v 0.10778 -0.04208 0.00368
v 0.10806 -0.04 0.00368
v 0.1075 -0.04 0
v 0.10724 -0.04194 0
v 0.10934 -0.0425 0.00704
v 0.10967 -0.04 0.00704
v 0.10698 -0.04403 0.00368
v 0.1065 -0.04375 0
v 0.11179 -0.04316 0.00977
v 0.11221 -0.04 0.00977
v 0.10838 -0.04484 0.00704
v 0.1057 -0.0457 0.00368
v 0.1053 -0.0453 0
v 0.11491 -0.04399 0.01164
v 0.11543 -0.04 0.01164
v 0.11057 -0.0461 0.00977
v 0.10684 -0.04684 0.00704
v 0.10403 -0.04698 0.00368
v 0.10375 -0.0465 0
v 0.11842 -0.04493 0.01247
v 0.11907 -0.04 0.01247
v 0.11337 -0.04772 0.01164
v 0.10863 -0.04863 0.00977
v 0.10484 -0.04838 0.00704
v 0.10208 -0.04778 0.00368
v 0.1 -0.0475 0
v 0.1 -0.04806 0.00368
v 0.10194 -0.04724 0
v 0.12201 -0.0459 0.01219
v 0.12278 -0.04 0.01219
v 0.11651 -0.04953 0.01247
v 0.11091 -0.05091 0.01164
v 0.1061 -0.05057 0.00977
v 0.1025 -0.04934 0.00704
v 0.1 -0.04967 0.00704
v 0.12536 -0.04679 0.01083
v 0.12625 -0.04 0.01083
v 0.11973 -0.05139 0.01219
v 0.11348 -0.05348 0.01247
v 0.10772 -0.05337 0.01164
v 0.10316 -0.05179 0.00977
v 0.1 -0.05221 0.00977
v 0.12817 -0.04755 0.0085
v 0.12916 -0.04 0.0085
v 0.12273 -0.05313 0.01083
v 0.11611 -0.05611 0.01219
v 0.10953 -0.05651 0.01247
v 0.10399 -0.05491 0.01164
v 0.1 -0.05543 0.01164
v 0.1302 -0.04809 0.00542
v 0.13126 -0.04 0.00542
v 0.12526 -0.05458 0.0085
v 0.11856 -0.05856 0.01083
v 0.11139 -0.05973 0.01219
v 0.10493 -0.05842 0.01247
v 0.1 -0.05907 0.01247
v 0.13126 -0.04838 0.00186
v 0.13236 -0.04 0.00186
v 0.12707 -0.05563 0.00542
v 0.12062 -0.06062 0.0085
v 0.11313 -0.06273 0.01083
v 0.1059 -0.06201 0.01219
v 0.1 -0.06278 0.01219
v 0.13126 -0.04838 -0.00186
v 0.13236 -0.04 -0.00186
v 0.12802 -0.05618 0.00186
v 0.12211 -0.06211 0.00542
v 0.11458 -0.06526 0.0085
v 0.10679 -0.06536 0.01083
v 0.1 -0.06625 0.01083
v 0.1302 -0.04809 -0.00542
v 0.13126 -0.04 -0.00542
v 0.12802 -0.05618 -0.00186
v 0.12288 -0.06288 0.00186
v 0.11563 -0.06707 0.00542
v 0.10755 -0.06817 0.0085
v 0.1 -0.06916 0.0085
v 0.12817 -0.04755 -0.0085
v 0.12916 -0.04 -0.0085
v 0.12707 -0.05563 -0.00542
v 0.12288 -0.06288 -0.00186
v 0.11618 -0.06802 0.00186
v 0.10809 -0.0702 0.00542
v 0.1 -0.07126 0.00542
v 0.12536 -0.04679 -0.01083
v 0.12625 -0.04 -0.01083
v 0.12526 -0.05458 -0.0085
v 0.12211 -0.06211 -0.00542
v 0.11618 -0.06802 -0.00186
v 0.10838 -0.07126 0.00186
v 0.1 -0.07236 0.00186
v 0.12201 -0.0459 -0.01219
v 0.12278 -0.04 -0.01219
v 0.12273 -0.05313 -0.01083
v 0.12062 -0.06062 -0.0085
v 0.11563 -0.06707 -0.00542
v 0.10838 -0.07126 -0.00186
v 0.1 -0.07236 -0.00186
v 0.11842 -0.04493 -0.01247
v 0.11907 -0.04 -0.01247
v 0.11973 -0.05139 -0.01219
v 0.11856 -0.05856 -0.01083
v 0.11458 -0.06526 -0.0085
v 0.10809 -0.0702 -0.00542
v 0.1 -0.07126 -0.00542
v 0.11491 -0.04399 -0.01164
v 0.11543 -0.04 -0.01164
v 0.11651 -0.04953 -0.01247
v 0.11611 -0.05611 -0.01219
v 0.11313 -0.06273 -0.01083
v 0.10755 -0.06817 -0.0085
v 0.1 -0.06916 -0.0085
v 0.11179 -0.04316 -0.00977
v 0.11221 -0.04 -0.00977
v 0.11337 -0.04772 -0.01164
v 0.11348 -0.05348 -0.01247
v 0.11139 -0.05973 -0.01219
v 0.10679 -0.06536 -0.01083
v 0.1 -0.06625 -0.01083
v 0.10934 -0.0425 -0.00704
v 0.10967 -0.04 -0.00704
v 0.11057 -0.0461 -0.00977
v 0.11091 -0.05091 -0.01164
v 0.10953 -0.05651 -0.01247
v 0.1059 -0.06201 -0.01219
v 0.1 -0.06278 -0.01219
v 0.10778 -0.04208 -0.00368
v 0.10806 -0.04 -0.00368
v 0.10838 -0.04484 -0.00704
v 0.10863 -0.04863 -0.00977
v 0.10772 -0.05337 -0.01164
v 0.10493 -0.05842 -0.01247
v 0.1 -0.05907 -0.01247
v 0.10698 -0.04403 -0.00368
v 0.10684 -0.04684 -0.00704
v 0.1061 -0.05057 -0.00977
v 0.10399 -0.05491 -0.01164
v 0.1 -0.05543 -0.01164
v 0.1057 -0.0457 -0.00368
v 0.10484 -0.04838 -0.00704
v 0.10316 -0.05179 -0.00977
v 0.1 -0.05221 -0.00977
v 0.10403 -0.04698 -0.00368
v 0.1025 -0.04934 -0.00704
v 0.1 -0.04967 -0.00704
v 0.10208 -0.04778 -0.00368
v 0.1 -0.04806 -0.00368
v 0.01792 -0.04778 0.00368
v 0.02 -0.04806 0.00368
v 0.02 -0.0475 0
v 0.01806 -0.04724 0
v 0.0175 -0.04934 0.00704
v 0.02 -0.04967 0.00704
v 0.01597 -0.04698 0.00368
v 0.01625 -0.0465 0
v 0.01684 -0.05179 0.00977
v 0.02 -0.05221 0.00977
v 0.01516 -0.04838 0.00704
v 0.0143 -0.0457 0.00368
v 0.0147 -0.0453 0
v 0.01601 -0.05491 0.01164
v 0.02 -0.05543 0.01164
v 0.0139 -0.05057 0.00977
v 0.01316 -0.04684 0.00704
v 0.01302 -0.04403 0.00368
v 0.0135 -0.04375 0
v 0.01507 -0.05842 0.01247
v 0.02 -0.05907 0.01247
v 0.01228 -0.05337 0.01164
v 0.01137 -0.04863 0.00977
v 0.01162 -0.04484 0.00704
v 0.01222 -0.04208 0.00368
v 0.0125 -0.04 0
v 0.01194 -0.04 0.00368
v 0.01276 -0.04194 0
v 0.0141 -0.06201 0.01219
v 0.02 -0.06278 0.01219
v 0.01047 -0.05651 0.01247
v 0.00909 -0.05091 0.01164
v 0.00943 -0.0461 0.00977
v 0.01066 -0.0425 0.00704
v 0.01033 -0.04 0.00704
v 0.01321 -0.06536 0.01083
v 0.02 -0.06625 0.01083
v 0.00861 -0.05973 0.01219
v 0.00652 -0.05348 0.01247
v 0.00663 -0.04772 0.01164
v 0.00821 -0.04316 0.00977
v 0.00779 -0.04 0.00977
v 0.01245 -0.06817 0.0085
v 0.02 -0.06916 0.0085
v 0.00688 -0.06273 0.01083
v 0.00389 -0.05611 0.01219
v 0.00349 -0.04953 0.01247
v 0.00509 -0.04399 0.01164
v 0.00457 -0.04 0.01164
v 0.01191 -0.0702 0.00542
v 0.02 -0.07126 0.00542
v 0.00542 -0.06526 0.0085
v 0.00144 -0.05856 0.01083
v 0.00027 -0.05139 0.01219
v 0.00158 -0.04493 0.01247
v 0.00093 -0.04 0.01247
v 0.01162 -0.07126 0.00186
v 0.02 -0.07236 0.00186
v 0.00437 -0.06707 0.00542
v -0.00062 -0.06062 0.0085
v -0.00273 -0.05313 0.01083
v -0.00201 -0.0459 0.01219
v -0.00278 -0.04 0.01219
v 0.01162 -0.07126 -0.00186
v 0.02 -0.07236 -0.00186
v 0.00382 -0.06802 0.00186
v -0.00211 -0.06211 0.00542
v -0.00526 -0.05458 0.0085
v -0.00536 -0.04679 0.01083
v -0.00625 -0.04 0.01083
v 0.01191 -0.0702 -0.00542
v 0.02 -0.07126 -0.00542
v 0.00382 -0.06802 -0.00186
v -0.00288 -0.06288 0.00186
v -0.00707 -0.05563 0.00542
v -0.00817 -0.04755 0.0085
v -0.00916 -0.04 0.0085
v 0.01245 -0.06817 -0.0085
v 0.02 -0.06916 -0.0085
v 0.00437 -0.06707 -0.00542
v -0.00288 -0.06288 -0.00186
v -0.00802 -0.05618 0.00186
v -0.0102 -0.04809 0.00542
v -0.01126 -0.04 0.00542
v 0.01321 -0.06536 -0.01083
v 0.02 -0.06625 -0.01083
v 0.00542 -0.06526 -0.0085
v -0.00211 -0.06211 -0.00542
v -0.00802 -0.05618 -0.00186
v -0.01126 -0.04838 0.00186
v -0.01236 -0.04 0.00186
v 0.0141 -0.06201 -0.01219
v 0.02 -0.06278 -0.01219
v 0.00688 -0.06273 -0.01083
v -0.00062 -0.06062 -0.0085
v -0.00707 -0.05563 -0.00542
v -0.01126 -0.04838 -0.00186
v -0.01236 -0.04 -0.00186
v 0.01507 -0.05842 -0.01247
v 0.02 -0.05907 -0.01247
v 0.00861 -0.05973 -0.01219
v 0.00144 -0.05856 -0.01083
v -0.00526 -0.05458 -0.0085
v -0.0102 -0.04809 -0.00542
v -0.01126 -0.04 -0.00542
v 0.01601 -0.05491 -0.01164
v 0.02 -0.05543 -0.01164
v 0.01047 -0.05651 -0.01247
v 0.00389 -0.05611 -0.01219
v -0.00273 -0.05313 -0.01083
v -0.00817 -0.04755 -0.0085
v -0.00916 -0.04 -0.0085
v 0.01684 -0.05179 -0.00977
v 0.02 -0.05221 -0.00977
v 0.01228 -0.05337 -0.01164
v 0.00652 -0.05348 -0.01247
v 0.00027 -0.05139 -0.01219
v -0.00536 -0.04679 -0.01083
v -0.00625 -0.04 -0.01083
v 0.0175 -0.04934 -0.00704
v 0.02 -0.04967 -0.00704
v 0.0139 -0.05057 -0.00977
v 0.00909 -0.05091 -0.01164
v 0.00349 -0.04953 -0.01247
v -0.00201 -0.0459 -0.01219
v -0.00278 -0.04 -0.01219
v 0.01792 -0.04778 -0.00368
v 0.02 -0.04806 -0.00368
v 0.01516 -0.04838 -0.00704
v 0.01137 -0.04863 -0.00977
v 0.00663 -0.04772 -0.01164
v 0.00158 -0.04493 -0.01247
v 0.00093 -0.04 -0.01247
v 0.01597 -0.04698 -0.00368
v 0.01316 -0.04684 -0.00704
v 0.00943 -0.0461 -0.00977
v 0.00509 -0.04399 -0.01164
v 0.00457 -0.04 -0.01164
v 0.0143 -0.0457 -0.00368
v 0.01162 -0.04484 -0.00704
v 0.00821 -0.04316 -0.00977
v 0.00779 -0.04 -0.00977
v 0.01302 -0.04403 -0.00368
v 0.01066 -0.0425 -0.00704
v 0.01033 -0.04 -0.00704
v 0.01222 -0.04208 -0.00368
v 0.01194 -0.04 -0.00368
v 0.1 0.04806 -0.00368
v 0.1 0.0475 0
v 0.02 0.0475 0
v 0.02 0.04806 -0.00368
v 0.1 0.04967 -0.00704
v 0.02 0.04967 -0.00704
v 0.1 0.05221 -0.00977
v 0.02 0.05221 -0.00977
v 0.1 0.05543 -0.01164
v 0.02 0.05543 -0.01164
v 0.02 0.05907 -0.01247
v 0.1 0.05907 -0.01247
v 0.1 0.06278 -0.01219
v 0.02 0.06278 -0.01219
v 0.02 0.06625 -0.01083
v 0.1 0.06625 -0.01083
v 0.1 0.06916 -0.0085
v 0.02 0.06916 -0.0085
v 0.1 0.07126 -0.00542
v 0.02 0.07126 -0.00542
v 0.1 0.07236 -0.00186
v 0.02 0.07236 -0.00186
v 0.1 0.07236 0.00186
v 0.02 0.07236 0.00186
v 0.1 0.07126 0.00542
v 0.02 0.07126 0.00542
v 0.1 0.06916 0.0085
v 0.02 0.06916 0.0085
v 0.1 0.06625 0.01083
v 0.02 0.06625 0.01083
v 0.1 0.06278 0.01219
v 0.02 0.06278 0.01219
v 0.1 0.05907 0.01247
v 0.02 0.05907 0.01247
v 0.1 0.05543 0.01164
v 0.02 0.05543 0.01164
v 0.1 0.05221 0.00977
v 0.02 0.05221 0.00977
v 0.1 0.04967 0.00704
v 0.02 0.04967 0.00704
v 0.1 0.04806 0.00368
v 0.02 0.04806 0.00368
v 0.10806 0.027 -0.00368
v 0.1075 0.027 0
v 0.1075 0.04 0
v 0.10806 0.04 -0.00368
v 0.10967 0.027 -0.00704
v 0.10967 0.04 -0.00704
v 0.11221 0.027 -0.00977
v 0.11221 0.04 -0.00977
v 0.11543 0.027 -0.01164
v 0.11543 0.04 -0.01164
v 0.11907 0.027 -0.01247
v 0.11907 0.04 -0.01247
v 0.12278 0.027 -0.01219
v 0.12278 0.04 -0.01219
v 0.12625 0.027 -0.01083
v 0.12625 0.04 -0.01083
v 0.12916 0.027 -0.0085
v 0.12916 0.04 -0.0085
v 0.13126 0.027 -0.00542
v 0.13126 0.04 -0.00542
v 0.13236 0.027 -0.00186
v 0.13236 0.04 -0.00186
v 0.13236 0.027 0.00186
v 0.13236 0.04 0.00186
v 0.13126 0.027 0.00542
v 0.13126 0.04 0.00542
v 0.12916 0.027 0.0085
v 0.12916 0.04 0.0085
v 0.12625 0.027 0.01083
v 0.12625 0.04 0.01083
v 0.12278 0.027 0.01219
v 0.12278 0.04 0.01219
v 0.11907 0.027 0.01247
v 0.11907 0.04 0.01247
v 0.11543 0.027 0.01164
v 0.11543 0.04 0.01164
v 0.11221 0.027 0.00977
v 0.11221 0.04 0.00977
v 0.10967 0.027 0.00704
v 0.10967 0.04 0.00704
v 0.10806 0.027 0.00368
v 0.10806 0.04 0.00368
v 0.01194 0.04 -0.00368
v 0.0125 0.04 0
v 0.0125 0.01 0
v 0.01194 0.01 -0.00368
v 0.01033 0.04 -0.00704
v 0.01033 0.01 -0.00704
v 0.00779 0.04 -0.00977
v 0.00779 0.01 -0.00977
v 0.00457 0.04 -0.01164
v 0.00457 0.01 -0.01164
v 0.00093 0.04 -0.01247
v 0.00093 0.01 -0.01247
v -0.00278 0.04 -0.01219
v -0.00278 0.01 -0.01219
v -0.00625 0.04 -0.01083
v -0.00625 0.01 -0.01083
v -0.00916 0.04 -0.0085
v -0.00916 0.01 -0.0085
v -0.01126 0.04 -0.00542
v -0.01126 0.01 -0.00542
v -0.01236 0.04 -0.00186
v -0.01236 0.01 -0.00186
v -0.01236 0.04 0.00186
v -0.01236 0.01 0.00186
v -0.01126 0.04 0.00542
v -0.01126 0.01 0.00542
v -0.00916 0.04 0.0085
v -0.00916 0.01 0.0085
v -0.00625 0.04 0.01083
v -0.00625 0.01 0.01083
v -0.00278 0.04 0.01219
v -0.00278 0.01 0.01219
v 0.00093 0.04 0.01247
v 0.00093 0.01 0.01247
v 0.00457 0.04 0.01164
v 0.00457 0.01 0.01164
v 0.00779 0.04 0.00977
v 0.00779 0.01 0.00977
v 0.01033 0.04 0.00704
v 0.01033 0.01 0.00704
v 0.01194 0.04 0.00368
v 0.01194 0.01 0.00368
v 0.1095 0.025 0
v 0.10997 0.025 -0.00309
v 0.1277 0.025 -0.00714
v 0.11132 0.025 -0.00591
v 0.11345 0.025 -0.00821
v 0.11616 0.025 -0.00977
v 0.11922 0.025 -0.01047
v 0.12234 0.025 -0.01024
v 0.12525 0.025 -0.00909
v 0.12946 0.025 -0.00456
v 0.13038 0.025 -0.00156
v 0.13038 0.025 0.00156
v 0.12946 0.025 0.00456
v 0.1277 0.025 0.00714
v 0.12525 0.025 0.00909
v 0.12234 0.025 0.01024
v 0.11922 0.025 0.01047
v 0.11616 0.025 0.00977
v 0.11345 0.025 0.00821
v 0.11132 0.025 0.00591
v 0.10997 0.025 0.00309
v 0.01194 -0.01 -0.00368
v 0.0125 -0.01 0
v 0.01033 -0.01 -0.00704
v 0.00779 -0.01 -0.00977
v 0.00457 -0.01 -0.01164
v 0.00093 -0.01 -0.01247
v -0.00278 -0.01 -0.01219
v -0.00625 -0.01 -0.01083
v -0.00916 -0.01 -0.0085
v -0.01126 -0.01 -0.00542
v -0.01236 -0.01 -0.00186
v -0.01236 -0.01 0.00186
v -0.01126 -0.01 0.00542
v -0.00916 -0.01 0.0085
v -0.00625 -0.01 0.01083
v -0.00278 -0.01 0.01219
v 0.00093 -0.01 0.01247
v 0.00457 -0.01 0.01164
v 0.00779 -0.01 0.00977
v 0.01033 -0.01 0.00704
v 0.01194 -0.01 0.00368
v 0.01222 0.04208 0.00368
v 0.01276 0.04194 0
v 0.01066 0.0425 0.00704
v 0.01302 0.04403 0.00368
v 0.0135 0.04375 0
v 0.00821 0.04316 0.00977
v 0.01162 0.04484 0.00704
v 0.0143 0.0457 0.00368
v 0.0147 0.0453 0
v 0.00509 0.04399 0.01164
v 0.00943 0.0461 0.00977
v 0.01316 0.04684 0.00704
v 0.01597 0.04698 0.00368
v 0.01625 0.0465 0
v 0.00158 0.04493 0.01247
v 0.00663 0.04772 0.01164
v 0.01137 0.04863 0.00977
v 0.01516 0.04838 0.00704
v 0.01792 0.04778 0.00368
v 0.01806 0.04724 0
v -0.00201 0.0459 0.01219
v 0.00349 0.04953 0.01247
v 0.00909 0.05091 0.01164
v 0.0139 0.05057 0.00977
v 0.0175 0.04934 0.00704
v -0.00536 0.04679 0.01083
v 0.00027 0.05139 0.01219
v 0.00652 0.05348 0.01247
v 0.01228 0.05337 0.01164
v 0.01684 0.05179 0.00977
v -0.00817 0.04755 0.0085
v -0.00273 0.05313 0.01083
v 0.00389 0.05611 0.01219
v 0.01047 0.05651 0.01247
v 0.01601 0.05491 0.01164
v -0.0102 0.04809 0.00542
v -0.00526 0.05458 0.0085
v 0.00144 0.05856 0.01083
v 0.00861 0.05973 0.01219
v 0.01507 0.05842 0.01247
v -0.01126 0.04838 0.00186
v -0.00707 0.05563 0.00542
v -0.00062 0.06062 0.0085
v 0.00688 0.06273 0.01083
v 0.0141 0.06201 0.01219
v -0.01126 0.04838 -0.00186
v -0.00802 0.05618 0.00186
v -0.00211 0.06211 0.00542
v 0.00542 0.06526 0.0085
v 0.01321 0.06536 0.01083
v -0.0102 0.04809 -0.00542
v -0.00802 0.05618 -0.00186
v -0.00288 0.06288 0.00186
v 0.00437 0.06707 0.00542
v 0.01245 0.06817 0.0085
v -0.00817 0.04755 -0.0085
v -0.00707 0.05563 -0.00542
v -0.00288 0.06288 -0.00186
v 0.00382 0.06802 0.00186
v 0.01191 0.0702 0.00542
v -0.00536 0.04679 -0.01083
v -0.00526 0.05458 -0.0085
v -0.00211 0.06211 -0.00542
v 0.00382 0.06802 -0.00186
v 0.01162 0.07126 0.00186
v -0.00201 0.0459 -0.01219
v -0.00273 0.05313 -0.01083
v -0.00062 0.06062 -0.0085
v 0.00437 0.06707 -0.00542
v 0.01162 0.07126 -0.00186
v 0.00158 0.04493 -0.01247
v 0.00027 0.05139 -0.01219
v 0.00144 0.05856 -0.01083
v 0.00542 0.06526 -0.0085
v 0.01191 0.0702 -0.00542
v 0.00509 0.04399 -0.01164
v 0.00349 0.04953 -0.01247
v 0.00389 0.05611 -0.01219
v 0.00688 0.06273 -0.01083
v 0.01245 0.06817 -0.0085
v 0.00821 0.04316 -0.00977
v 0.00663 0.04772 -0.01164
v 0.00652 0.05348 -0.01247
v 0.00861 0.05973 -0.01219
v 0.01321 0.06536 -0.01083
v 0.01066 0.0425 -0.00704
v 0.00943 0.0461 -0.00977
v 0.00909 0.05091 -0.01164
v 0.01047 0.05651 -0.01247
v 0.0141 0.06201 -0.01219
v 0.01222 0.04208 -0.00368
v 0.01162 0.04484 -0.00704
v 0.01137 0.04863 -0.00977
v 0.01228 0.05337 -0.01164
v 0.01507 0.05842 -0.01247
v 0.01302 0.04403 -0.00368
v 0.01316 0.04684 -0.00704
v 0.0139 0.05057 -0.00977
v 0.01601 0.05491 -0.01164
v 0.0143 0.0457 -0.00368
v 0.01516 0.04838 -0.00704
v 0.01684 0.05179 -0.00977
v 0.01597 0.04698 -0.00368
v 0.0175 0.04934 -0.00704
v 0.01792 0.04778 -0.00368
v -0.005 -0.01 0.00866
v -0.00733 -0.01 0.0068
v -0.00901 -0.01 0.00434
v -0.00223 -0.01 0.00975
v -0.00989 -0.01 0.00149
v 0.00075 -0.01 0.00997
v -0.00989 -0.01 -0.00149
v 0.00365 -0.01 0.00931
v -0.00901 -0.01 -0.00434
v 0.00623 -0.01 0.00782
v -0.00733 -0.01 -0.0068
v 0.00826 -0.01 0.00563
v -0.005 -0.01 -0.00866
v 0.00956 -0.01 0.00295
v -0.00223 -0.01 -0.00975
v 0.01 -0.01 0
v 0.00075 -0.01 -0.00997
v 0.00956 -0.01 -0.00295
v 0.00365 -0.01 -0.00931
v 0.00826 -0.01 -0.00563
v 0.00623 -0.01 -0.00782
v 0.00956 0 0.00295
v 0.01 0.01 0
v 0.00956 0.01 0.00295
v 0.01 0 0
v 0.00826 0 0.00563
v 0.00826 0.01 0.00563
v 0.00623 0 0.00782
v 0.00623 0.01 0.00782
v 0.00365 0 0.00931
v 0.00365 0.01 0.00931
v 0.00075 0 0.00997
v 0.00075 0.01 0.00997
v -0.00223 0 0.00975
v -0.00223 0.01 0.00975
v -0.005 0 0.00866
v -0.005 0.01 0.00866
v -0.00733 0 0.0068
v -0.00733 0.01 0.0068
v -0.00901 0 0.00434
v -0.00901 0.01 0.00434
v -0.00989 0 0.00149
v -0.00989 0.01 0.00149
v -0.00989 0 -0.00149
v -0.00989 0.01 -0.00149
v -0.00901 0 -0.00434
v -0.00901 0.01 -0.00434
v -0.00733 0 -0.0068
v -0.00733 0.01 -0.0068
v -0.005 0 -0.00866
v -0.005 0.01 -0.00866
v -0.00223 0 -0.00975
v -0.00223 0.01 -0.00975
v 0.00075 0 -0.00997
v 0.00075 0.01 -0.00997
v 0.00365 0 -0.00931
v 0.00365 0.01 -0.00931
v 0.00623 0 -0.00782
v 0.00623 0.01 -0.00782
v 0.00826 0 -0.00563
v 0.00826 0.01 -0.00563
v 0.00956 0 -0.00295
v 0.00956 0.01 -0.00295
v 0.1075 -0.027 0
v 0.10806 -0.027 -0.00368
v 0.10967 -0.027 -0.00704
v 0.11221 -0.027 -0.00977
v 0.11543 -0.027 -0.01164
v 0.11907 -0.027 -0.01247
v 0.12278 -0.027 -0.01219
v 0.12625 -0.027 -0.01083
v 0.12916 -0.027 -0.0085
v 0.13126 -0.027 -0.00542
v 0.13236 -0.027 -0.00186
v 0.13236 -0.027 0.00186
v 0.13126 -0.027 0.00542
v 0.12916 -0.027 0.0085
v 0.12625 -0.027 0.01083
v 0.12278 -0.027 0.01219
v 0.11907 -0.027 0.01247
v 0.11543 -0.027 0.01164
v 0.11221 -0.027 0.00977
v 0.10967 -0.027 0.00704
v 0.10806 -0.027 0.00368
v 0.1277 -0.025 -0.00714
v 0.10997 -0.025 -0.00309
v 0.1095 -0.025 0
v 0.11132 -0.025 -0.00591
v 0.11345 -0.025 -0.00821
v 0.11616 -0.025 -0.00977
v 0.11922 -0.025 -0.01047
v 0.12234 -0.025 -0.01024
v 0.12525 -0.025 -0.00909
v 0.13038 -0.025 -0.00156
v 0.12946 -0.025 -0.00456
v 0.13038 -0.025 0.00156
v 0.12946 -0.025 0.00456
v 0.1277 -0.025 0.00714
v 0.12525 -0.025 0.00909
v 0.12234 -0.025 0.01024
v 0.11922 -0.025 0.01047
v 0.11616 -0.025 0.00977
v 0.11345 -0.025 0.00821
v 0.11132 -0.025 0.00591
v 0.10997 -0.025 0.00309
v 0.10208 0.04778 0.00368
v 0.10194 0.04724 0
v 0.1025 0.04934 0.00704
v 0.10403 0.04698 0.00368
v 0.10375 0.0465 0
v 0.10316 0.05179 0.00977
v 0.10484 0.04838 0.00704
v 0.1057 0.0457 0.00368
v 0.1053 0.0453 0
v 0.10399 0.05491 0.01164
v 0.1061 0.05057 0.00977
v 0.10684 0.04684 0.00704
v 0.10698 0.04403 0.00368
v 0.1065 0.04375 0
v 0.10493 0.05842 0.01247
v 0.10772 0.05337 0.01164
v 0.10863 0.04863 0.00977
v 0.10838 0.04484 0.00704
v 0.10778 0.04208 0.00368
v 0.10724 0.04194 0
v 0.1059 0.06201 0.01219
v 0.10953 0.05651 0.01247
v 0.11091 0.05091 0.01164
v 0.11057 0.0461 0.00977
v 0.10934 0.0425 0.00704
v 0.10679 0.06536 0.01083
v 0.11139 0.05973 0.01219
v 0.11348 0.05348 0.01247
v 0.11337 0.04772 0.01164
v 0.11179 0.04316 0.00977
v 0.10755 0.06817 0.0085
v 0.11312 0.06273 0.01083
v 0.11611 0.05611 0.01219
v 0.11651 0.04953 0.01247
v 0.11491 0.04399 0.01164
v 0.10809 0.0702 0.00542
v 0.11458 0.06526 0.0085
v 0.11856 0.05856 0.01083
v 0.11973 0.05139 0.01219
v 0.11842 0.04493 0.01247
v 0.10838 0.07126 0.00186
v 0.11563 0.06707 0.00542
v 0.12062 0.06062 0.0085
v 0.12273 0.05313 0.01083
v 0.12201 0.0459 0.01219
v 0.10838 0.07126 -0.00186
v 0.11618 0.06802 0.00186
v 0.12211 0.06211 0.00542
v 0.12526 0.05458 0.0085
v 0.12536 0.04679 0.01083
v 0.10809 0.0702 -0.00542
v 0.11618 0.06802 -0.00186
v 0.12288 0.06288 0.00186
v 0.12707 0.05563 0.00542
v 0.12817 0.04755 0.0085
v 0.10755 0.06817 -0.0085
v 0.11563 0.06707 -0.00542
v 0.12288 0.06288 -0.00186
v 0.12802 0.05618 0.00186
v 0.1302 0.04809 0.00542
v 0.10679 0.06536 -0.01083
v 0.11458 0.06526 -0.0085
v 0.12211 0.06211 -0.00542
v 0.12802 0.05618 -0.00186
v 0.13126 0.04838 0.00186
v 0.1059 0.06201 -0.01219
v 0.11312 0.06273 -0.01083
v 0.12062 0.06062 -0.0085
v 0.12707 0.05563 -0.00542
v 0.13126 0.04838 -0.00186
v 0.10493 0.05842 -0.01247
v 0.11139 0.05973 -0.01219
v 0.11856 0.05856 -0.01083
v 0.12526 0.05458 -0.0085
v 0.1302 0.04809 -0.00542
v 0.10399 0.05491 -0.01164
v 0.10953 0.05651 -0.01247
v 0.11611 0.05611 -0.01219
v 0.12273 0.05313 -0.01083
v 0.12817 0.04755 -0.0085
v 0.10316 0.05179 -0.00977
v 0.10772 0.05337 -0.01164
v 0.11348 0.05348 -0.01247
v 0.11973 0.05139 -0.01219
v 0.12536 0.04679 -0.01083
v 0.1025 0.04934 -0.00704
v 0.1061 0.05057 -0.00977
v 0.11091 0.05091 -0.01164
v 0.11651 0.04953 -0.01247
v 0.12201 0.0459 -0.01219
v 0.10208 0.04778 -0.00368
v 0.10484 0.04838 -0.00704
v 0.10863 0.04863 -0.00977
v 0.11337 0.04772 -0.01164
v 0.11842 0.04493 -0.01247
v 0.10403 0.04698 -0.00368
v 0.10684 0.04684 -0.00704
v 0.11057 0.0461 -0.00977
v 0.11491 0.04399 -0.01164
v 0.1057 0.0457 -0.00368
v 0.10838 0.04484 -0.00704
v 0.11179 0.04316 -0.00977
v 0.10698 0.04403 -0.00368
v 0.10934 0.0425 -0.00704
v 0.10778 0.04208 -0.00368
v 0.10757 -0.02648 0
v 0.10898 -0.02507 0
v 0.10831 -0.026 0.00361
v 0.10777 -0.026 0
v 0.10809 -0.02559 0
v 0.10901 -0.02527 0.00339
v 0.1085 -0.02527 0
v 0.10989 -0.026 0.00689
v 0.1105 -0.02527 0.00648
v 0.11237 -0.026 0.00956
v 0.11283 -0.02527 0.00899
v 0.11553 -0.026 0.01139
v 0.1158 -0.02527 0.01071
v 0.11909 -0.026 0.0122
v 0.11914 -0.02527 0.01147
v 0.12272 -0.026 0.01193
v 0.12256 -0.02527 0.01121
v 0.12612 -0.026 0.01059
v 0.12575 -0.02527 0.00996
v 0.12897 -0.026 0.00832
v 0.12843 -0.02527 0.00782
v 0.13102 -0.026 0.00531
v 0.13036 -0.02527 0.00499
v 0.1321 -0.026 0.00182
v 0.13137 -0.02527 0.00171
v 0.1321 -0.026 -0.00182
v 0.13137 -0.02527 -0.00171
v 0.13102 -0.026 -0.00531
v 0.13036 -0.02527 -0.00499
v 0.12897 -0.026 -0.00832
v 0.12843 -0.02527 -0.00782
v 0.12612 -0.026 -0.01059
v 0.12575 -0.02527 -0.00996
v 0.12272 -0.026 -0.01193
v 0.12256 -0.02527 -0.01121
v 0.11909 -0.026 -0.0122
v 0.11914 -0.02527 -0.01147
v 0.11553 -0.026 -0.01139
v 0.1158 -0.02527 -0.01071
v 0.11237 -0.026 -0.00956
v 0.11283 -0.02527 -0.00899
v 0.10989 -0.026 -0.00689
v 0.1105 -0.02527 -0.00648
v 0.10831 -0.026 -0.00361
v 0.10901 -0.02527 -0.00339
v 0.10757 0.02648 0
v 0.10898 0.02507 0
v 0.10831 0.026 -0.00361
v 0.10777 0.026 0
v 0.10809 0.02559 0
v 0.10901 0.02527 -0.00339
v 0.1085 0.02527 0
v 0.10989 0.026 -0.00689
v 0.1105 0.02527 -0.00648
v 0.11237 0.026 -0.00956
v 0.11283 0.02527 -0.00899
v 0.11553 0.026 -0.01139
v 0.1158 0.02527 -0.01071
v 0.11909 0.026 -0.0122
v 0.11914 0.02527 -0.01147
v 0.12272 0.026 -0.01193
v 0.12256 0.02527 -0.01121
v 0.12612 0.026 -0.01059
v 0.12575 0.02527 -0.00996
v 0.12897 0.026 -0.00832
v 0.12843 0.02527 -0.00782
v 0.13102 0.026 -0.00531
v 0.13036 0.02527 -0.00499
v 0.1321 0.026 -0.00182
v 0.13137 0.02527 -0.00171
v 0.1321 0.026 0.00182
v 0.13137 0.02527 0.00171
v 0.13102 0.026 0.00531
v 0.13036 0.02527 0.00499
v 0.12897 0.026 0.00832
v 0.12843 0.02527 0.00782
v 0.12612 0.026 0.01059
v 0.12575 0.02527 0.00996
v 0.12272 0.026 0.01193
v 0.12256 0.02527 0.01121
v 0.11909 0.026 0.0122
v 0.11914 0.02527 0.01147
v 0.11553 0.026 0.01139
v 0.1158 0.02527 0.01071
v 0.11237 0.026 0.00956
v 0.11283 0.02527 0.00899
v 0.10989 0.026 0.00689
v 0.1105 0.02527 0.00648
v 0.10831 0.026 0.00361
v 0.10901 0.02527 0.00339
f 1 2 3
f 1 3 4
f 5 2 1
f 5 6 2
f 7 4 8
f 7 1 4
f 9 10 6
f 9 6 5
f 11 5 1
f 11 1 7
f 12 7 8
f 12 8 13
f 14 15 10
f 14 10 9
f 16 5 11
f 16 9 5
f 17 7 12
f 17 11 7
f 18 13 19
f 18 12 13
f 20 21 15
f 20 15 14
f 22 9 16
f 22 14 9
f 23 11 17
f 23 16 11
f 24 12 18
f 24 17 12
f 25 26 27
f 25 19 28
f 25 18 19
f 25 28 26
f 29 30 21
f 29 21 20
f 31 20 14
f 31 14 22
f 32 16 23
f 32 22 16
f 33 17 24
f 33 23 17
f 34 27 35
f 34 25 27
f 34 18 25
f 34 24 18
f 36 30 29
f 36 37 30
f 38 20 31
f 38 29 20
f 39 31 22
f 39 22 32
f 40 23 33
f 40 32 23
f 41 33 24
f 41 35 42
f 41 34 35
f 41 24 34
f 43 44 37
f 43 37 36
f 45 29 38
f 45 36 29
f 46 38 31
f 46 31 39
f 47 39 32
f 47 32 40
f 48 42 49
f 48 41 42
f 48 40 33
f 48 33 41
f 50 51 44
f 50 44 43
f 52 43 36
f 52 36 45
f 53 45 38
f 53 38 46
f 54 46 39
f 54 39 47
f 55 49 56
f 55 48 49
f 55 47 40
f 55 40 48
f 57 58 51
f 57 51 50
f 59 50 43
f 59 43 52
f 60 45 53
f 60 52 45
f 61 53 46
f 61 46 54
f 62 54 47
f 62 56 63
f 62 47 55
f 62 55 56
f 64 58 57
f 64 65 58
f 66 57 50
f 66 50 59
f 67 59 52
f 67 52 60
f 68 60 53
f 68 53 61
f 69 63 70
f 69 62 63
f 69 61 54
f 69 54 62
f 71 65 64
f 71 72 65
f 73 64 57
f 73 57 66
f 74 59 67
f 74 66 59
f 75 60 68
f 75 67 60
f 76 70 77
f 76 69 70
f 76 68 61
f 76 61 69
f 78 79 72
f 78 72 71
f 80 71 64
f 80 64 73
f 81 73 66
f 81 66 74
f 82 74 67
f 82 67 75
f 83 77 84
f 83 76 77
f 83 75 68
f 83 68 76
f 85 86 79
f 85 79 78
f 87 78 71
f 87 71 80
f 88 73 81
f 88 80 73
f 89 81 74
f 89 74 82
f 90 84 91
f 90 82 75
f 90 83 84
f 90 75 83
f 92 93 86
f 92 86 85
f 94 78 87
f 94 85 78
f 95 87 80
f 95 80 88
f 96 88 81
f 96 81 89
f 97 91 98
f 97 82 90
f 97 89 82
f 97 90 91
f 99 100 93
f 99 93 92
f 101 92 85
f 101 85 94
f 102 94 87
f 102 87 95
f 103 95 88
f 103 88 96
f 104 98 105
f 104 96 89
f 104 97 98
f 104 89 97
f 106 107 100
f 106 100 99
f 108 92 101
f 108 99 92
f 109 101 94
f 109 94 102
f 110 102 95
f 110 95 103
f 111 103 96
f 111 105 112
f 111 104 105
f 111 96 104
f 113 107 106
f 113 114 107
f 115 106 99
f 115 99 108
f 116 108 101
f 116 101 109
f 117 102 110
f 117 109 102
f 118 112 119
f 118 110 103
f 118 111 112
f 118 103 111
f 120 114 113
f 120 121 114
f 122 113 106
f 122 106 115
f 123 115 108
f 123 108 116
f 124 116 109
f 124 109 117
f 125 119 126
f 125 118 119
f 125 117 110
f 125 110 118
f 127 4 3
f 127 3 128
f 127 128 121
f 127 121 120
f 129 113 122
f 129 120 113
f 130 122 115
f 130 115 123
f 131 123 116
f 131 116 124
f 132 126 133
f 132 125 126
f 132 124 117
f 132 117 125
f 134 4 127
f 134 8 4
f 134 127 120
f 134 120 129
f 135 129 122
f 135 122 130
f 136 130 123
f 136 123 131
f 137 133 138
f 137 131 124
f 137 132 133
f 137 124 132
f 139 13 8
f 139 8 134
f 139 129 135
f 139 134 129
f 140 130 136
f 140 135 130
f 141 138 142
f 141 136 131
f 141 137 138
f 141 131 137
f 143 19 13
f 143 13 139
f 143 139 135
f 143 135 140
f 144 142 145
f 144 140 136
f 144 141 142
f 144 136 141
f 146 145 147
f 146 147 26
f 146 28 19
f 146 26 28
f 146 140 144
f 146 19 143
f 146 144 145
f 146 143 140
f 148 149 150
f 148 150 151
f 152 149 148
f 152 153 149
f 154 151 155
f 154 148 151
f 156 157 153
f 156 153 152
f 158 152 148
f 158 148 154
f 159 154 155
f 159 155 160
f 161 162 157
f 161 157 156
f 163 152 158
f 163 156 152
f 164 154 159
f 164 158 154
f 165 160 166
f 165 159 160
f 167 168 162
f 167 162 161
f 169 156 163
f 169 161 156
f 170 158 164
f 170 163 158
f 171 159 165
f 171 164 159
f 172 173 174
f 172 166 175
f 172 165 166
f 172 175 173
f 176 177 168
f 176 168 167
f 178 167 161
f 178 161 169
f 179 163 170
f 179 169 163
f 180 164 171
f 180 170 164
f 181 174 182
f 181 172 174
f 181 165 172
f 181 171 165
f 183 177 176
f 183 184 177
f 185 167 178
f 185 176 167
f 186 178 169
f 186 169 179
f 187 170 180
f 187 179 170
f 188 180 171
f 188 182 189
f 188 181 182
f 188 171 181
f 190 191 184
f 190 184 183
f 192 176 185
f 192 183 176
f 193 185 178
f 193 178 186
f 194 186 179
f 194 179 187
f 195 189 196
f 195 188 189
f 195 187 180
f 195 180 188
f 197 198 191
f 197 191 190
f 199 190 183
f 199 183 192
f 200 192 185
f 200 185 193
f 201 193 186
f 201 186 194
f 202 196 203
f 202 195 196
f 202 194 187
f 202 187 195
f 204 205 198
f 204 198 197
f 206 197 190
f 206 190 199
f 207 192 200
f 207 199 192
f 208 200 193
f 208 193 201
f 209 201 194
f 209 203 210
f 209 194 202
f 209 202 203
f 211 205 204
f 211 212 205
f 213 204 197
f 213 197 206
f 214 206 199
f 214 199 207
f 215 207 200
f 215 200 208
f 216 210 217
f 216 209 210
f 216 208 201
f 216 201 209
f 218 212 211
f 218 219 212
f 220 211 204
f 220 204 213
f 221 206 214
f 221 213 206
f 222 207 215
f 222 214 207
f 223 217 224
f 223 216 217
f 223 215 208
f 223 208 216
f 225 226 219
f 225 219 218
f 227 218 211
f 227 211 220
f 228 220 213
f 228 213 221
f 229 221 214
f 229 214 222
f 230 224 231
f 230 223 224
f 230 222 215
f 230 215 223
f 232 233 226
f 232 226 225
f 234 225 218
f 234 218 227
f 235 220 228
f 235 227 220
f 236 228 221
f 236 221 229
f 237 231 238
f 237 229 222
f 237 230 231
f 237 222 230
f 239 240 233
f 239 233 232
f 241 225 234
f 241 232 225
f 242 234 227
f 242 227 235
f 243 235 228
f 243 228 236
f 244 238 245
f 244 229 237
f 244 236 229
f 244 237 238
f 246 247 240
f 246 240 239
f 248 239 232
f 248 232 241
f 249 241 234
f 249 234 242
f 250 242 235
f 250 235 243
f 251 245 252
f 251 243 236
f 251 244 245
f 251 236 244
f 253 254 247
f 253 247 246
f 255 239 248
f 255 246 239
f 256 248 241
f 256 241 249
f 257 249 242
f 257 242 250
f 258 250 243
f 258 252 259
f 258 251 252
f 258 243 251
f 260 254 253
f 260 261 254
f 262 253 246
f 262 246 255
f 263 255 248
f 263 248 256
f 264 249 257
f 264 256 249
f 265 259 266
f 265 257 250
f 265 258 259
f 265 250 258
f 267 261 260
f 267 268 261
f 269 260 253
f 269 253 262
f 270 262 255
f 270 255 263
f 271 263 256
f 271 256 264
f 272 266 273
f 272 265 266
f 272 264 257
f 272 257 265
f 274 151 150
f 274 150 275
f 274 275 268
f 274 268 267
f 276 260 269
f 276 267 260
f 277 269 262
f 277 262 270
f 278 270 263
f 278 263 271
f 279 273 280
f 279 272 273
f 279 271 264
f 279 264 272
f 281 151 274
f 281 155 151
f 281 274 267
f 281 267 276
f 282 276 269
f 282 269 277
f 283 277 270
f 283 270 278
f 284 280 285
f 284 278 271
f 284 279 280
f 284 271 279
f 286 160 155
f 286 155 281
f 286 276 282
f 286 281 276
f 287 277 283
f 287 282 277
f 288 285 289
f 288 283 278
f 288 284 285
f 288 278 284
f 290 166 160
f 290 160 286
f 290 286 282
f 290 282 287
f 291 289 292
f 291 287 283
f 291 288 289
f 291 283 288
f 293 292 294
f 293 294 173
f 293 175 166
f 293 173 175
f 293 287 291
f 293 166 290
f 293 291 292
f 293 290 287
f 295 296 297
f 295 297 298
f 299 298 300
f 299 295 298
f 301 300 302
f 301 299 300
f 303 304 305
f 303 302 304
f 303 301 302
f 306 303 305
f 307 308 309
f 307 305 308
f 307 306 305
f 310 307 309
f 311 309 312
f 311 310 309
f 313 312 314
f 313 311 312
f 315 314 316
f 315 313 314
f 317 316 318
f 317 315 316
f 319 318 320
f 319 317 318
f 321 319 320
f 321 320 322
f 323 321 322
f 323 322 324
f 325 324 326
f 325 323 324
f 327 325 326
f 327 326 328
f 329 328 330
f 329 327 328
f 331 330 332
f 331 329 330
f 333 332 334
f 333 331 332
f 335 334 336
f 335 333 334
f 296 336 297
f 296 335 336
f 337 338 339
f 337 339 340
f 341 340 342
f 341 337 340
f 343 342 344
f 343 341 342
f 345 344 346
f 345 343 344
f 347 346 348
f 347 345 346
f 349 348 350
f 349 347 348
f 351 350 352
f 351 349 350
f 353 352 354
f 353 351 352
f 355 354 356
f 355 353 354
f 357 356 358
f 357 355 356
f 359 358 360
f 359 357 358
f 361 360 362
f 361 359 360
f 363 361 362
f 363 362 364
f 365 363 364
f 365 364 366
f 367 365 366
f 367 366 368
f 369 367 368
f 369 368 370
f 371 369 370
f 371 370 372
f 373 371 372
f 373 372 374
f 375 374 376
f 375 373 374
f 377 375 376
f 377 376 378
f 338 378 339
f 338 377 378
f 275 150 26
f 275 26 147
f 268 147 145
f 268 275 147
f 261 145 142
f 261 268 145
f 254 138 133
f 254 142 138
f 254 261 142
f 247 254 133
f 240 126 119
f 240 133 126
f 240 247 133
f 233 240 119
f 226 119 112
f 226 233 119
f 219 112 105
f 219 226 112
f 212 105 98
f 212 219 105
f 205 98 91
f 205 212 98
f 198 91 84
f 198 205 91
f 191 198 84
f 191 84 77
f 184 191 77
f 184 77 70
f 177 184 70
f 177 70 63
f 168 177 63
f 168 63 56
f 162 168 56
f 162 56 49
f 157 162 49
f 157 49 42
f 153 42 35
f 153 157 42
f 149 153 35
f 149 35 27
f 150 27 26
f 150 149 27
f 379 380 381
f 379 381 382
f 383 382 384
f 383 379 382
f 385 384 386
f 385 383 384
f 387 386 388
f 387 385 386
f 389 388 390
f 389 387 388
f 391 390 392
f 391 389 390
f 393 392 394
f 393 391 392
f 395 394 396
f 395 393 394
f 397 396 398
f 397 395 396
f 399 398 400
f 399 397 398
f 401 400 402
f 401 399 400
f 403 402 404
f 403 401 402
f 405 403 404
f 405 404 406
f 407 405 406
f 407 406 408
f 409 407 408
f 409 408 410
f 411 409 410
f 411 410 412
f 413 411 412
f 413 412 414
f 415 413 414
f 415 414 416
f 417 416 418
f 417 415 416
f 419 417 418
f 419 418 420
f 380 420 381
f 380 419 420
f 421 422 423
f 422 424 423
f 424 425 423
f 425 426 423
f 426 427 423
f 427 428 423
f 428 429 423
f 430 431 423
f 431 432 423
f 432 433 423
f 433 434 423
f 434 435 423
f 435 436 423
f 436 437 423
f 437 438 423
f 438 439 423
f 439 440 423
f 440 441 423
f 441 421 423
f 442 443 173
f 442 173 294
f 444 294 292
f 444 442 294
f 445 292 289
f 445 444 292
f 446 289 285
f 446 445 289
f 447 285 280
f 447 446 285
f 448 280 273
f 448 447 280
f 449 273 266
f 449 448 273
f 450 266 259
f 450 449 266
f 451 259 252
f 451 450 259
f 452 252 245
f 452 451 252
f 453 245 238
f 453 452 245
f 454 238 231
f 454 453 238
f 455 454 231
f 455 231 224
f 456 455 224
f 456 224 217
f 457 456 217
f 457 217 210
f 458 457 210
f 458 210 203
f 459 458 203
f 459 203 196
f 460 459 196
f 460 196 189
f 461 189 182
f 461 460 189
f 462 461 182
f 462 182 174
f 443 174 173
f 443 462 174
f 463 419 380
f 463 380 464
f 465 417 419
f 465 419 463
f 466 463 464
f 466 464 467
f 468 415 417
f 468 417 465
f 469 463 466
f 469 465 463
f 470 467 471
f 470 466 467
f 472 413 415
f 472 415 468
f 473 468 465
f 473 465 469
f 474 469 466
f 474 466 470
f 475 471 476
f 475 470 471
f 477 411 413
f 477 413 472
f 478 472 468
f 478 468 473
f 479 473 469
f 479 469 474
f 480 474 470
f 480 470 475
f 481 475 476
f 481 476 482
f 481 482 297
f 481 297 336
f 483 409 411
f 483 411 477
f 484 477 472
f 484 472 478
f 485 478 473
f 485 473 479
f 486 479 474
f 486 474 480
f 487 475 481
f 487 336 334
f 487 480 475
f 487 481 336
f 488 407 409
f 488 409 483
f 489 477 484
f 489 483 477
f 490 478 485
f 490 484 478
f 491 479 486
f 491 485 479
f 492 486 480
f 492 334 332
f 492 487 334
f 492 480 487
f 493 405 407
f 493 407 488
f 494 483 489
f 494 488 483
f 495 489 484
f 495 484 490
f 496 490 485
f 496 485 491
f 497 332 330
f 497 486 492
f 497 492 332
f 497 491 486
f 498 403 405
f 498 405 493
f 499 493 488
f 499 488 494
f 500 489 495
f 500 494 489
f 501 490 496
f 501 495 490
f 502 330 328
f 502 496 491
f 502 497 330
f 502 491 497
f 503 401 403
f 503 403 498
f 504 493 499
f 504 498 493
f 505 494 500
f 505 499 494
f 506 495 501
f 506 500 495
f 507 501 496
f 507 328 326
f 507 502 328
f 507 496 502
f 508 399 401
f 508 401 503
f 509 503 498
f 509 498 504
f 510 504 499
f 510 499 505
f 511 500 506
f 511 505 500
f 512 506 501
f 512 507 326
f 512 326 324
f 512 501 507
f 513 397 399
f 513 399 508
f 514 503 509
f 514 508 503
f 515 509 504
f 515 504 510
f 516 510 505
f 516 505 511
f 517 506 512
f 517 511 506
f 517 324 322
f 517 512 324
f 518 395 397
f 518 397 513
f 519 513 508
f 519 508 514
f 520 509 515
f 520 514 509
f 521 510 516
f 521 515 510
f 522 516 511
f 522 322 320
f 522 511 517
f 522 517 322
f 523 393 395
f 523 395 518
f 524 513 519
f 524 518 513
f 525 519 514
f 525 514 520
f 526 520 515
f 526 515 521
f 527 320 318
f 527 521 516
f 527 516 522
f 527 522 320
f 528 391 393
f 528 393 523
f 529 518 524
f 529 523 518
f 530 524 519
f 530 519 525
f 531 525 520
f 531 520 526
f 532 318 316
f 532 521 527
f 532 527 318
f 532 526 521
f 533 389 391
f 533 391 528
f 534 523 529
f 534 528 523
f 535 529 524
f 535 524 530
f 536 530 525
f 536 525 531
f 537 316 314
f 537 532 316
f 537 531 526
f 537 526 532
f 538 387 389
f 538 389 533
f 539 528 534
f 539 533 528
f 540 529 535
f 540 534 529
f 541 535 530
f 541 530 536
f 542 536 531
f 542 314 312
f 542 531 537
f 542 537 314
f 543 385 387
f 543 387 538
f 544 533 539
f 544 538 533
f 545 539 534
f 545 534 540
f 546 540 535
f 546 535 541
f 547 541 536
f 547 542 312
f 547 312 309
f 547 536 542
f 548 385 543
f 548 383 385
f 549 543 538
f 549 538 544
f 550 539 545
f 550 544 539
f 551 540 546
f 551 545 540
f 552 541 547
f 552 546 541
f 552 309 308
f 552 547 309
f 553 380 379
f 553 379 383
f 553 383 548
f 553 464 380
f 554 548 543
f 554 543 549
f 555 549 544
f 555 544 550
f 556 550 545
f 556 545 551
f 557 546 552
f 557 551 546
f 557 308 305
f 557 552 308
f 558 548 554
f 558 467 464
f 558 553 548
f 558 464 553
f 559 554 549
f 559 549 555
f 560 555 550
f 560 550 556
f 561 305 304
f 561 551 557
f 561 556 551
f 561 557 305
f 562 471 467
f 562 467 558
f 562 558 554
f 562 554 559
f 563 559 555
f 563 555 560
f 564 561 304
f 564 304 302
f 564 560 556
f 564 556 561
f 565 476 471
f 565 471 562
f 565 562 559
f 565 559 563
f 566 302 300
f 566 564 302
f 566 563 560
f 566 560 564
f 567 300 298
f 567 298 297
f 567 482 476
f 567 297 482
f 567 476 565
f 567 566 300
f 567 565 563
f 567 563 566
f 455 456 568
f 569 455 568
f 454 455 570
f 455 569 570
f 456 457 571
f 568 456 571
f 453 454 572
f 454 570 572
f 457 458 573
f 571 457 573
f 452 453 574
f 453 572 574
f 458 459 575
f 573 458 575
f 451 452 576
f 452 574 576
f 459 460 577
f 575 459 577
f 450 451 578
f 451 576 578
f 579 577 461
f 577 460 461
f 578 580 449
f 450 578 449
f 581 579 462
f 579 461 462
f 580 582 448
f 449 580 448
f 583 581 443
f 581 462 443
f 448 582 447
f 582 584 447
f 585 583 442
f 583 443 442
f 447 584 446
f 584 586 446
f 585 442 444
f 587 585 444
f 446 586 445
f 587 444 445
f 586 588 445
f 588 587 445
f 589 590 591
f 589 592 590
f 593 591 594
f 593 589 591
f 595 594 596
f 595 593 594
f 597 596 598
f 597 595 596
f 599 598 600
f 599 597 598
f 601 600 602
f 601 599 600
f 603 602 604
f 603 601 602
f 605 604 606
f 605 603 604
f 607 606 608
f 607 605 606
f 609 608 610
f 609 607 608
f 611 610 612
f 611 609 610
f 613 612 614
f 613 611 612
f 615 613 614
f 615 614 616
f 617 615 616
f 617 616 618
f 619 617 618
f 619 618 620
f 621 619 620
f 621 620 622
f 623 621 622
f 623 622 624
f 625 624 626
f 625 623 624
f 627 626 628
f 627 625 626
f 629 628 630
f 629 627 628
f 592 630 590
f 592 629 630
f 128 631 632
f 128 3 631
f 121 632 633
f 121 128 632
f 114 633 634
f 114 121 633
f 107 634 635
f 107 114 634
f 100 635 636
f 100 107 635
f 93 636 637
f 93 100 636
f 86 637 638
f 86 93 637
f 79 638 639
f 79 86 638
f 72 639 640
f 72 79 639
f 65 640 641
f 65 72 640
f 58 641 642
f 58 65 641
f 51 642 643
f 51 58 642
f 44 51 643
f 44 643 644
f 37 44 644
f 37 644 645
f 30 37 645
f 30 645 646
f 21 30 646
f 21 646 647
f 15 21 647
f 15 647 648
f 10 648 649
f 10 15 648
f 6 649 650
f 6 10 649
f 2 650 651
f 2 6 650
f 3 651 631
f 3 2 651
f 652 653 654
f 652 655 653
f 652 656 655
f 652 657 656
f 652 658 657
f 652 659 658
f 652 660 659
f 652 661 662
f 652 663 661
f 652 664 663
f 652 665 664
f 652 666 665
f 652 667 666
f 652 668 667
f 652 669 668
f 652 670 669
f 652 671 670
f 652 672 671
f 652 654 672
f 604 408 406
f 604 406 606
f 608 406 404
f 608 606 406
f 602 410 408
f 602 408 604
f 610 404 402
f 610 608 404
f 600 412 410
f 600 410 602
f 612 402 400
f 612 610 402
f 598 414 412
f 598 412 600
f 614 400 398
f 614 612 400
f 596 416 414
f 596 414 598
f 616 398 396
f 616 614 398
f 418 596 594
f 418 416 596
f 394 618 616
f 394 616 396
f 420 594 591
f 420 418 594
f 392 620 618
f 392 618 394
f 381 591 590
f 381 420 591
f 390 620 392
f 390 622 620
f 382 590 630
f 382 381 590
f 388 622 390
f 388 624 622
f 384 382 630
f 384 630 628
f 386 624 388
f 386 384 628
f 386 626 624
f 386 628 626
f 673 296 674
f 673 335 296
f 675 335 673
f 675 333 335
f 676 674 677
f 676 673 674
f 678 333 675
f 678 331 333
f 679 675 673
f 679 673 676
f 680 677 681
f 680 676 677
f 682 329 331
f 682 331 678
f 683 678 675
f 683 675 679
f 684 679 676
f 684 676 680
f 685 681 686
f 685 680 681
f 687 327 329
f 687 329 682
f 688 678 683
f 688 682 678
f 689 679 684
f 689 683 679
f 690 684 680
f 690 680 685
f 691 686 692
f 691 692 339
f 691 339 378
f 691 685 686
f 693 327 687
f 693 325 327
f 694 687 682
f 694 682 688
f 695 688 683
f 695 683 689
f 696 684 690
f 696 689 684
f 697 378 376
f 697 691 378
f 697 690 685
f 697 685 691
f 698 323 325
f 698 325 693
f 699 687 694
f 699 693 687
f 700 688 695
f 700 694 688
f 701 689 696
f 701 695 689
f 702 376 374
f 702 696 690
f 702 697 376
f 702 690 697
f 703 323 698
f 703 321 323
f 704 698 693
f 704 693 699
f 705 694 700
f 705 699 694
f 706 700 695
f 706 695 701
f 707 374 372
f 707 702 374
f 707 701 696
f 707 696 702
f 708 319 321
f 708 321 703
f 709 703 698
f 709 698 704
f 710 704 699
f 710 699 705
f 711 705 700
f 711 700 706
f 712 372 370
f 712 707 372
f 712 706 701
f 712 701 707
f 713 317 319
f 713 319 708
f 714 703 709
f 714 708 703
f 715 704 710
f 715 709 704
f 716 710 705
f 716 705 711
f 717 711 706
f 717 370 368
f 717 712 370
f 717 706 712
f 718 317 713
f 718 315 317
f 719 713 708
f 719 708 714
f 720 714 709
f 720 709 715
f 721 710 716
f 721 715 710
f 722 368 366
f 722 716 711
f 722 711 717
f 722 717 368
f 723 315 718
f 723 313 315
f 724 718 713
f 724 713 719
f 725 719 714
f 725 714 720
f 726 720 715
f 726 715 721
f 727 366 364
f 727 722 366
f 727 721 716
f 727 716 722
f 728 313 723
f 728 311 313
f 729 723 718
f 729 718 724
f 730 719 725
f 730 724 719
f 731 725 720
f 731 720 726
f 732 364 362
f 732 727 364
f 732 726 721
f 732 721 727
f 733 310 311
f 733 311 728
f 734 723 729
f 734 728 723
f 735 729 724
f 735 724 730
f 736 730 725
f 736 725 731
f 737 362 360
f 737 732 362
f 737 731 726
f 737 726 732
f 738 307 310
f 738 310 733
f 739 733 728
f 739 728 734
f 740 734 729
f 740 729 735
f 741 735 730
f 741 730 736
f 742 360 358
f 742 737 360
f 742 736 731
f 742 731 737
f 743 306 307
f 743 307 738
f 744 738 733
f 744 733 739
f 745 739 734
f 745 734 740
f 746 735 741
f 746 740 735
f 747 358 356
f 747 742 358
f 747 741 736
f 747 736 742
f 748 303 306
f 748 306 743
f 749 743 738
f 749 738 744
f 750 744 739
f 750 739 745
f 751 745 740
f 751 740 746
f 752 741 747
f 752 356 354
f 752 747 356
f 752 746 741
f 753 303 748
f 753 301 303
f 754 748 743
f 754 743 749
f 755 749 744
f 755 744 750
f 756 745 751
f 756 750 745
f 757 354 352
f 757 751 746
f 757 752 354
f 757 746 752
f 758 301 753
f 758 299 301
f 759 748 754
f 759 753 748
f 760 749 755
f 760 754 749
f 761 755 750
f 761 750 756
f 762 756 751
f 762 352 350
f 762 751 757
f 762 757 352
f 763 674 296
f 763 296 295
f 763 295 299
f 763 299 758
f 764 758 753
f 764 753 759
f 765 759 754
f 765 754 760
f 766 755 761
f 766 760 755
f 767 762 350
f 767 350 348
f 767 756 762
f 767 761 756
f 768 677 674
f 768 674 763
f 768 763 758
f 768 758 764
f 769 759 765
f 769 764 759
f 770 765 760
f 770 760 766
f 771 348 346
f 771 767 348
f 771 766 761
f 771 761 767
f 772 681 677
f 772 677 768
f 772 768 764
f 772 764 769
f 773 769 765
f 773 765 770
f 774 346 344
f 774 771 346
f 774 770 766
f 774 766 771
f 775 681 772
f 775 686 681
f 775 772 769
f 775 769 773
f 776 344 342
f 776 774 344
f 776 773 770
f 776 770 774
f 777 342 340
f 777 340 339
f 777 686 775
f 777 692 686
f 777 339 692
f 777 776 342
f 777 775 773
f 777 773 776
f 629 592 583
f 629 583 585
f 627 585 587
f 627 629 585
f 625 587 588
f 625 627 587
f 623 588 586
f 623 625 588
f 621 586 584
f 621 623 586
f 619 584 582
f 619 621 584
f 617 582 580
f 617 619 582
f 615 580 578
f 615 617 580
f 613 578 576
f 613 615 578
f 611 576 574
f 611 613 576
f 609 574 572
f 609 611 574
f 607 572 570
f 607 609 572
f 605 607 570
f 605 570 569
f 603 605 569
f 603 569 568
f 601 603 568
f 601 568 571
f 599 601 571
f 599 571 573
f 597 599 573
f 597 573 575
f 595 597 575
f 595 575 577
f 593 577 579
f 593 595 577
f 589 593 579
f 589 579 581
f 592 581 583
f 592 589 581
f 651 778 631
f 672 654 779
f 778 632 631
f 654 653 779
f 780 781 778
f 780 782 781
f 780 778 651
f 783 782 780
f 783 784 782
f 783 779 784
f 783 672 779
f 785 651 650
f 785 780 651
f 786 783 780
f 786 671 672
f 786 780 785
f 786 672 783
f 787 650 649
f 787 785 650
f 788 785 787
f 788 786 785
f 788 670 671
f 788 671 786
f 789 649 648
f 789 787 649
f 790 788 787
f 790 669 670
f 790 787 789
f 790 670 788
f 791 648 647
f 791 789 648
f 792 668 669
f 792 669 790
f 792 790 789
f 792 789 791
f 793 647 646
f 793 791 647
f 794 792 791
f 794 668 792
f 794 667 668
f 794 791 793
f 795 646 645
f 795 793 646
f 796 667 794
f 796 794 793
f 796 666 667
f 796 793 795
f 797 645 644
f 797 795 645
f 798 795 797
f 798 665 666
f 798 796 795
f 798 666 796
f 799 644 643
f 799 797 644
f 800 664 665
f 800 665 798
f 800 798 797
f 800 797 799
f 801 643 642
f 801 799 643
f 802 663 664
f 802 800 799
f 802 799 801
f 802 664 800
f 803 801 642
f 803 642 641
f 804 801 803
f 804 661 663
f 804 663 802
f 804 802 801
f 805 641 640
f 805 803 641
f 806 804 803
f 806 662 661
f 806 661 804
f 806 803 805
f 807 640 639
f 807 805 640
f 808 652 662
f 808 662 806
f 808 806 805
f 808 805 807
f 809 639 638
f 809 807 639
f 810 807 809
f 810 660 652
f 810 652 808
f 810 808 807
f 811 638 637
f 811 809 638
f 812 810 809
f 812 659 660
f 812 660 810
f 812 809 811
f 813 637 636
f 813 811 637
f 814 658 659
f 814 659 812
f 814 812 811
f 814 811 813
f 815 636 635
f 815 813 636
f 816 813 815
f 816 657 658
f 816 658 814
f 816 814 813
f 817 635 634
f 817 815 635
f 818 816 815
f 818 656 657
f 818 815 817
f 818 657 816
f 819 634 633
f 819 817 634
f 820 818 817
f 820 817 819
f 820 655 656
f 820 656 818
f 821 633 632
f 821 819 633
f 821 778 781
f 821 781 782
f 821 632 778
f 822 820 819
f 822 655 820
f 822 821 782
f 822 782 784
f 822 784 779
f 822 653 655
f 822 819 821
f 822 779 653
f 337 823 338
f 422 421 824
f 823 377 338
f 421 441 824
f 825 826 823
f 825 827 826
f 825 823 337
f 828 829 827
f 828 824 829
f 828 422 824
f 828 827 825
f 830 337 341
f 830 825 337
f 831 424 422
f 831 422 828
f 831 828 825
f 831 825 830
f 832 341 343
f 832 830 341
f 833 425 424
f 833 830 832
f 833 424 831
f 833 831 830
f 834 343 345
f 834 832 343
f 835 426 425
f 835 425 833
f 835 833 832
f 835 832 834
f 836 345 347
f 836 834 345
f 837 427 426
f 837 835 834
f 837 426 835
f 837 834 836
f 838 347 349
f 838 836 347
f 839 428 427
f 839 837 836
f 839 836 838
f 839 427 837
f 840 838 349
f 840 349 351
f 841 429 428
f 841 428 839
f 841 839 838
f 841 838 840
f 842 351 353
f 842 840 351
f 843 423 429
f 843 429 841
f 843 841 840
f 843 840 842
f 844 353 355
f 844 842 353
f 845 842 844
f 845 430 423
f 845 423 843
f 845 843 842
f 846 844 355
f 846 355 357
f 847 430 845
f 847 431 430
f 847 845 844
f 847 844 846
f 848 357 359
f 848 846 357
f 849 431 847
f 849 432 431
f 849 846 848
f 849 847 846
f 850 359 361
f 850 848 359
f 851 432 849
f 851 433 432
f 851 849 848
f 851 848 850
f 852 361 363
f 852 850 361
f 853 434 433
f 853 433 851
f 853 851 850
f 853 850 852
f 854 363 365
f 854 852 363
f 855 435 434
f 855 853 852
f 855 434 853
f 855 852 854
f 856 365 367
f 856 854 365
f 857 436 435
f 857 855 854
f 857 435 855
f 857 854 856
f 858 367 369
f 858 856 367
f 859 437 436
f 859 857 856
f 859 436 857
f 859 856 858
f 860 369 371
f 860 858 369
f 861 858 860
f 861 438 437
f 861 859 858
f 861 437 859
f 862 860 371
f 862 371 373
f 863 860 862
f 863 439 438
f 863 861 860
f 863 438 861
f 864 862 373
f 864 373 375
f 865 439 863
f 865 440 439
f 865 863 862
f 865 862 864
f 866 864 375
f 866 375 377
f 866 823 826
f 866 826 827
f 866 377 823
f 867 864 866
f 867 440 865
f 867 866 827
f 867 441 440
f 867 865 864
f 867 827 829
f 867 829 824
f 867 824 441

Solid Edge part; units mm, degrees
sketch "Sketch1" plane through (0, 0, 0) normal (0, 0, 1) x (1, 0, 0)
  line L0 (0.12, -0.025) -> (0.12, -0.04)
  arc A0 (0.1, -0.06) -> (0.12, -0.04) centre (0.1, -0.04) ccw
  line L1 (0.02, -0.06) -> (0.1, -0.06)
  arc A1 (0, -0.04) -> (0.02, -0.06) centre (0.02, -0.04) ccw
  line L2 (0, 0.04) -> (0, -0.04)
  arc A2 (0.02, 0.06) -> (0, 0.04) centre (0.02, 0.04) ccw
  line L3 (0.02, 0.06) -> (0.1, 0.06)
  arc A3 (0.1, 0.06) -> (0.12, 0.04) centre (0.1, 0.04) cw
  line L4 (0.12, 0.04) -> (0.12, 0.025)
  dimension "D1" = 0.12
  dimension "D2" = 0.05
  dimension "D3" = 0.12
sketch "Sketch2" plane through (0, 0, 0) normal (0, -1, 0) x (1, 0, 0)
  circle A0 centre (0, 0) radius 0.0125
sweep "SweptProtrusion1" add profiles "Sketch2" path "Sketch1"
fillet "Round1" radius 0.002 2 edges at (0.1325, 0.025, 0) (0.1325, -0.025, 0)
sketch "Sketch3" plane through (0, 0, 0) normal (0, -1, 0) x (1, 0, 0)
  circle A0 centre (0, 0) radius 0.0125
  circle A1 centre (0, 0) radius 0.01
extrude "Ausschnitt_1" cut sketch "Sketch3" along normal mid plane 0.02
